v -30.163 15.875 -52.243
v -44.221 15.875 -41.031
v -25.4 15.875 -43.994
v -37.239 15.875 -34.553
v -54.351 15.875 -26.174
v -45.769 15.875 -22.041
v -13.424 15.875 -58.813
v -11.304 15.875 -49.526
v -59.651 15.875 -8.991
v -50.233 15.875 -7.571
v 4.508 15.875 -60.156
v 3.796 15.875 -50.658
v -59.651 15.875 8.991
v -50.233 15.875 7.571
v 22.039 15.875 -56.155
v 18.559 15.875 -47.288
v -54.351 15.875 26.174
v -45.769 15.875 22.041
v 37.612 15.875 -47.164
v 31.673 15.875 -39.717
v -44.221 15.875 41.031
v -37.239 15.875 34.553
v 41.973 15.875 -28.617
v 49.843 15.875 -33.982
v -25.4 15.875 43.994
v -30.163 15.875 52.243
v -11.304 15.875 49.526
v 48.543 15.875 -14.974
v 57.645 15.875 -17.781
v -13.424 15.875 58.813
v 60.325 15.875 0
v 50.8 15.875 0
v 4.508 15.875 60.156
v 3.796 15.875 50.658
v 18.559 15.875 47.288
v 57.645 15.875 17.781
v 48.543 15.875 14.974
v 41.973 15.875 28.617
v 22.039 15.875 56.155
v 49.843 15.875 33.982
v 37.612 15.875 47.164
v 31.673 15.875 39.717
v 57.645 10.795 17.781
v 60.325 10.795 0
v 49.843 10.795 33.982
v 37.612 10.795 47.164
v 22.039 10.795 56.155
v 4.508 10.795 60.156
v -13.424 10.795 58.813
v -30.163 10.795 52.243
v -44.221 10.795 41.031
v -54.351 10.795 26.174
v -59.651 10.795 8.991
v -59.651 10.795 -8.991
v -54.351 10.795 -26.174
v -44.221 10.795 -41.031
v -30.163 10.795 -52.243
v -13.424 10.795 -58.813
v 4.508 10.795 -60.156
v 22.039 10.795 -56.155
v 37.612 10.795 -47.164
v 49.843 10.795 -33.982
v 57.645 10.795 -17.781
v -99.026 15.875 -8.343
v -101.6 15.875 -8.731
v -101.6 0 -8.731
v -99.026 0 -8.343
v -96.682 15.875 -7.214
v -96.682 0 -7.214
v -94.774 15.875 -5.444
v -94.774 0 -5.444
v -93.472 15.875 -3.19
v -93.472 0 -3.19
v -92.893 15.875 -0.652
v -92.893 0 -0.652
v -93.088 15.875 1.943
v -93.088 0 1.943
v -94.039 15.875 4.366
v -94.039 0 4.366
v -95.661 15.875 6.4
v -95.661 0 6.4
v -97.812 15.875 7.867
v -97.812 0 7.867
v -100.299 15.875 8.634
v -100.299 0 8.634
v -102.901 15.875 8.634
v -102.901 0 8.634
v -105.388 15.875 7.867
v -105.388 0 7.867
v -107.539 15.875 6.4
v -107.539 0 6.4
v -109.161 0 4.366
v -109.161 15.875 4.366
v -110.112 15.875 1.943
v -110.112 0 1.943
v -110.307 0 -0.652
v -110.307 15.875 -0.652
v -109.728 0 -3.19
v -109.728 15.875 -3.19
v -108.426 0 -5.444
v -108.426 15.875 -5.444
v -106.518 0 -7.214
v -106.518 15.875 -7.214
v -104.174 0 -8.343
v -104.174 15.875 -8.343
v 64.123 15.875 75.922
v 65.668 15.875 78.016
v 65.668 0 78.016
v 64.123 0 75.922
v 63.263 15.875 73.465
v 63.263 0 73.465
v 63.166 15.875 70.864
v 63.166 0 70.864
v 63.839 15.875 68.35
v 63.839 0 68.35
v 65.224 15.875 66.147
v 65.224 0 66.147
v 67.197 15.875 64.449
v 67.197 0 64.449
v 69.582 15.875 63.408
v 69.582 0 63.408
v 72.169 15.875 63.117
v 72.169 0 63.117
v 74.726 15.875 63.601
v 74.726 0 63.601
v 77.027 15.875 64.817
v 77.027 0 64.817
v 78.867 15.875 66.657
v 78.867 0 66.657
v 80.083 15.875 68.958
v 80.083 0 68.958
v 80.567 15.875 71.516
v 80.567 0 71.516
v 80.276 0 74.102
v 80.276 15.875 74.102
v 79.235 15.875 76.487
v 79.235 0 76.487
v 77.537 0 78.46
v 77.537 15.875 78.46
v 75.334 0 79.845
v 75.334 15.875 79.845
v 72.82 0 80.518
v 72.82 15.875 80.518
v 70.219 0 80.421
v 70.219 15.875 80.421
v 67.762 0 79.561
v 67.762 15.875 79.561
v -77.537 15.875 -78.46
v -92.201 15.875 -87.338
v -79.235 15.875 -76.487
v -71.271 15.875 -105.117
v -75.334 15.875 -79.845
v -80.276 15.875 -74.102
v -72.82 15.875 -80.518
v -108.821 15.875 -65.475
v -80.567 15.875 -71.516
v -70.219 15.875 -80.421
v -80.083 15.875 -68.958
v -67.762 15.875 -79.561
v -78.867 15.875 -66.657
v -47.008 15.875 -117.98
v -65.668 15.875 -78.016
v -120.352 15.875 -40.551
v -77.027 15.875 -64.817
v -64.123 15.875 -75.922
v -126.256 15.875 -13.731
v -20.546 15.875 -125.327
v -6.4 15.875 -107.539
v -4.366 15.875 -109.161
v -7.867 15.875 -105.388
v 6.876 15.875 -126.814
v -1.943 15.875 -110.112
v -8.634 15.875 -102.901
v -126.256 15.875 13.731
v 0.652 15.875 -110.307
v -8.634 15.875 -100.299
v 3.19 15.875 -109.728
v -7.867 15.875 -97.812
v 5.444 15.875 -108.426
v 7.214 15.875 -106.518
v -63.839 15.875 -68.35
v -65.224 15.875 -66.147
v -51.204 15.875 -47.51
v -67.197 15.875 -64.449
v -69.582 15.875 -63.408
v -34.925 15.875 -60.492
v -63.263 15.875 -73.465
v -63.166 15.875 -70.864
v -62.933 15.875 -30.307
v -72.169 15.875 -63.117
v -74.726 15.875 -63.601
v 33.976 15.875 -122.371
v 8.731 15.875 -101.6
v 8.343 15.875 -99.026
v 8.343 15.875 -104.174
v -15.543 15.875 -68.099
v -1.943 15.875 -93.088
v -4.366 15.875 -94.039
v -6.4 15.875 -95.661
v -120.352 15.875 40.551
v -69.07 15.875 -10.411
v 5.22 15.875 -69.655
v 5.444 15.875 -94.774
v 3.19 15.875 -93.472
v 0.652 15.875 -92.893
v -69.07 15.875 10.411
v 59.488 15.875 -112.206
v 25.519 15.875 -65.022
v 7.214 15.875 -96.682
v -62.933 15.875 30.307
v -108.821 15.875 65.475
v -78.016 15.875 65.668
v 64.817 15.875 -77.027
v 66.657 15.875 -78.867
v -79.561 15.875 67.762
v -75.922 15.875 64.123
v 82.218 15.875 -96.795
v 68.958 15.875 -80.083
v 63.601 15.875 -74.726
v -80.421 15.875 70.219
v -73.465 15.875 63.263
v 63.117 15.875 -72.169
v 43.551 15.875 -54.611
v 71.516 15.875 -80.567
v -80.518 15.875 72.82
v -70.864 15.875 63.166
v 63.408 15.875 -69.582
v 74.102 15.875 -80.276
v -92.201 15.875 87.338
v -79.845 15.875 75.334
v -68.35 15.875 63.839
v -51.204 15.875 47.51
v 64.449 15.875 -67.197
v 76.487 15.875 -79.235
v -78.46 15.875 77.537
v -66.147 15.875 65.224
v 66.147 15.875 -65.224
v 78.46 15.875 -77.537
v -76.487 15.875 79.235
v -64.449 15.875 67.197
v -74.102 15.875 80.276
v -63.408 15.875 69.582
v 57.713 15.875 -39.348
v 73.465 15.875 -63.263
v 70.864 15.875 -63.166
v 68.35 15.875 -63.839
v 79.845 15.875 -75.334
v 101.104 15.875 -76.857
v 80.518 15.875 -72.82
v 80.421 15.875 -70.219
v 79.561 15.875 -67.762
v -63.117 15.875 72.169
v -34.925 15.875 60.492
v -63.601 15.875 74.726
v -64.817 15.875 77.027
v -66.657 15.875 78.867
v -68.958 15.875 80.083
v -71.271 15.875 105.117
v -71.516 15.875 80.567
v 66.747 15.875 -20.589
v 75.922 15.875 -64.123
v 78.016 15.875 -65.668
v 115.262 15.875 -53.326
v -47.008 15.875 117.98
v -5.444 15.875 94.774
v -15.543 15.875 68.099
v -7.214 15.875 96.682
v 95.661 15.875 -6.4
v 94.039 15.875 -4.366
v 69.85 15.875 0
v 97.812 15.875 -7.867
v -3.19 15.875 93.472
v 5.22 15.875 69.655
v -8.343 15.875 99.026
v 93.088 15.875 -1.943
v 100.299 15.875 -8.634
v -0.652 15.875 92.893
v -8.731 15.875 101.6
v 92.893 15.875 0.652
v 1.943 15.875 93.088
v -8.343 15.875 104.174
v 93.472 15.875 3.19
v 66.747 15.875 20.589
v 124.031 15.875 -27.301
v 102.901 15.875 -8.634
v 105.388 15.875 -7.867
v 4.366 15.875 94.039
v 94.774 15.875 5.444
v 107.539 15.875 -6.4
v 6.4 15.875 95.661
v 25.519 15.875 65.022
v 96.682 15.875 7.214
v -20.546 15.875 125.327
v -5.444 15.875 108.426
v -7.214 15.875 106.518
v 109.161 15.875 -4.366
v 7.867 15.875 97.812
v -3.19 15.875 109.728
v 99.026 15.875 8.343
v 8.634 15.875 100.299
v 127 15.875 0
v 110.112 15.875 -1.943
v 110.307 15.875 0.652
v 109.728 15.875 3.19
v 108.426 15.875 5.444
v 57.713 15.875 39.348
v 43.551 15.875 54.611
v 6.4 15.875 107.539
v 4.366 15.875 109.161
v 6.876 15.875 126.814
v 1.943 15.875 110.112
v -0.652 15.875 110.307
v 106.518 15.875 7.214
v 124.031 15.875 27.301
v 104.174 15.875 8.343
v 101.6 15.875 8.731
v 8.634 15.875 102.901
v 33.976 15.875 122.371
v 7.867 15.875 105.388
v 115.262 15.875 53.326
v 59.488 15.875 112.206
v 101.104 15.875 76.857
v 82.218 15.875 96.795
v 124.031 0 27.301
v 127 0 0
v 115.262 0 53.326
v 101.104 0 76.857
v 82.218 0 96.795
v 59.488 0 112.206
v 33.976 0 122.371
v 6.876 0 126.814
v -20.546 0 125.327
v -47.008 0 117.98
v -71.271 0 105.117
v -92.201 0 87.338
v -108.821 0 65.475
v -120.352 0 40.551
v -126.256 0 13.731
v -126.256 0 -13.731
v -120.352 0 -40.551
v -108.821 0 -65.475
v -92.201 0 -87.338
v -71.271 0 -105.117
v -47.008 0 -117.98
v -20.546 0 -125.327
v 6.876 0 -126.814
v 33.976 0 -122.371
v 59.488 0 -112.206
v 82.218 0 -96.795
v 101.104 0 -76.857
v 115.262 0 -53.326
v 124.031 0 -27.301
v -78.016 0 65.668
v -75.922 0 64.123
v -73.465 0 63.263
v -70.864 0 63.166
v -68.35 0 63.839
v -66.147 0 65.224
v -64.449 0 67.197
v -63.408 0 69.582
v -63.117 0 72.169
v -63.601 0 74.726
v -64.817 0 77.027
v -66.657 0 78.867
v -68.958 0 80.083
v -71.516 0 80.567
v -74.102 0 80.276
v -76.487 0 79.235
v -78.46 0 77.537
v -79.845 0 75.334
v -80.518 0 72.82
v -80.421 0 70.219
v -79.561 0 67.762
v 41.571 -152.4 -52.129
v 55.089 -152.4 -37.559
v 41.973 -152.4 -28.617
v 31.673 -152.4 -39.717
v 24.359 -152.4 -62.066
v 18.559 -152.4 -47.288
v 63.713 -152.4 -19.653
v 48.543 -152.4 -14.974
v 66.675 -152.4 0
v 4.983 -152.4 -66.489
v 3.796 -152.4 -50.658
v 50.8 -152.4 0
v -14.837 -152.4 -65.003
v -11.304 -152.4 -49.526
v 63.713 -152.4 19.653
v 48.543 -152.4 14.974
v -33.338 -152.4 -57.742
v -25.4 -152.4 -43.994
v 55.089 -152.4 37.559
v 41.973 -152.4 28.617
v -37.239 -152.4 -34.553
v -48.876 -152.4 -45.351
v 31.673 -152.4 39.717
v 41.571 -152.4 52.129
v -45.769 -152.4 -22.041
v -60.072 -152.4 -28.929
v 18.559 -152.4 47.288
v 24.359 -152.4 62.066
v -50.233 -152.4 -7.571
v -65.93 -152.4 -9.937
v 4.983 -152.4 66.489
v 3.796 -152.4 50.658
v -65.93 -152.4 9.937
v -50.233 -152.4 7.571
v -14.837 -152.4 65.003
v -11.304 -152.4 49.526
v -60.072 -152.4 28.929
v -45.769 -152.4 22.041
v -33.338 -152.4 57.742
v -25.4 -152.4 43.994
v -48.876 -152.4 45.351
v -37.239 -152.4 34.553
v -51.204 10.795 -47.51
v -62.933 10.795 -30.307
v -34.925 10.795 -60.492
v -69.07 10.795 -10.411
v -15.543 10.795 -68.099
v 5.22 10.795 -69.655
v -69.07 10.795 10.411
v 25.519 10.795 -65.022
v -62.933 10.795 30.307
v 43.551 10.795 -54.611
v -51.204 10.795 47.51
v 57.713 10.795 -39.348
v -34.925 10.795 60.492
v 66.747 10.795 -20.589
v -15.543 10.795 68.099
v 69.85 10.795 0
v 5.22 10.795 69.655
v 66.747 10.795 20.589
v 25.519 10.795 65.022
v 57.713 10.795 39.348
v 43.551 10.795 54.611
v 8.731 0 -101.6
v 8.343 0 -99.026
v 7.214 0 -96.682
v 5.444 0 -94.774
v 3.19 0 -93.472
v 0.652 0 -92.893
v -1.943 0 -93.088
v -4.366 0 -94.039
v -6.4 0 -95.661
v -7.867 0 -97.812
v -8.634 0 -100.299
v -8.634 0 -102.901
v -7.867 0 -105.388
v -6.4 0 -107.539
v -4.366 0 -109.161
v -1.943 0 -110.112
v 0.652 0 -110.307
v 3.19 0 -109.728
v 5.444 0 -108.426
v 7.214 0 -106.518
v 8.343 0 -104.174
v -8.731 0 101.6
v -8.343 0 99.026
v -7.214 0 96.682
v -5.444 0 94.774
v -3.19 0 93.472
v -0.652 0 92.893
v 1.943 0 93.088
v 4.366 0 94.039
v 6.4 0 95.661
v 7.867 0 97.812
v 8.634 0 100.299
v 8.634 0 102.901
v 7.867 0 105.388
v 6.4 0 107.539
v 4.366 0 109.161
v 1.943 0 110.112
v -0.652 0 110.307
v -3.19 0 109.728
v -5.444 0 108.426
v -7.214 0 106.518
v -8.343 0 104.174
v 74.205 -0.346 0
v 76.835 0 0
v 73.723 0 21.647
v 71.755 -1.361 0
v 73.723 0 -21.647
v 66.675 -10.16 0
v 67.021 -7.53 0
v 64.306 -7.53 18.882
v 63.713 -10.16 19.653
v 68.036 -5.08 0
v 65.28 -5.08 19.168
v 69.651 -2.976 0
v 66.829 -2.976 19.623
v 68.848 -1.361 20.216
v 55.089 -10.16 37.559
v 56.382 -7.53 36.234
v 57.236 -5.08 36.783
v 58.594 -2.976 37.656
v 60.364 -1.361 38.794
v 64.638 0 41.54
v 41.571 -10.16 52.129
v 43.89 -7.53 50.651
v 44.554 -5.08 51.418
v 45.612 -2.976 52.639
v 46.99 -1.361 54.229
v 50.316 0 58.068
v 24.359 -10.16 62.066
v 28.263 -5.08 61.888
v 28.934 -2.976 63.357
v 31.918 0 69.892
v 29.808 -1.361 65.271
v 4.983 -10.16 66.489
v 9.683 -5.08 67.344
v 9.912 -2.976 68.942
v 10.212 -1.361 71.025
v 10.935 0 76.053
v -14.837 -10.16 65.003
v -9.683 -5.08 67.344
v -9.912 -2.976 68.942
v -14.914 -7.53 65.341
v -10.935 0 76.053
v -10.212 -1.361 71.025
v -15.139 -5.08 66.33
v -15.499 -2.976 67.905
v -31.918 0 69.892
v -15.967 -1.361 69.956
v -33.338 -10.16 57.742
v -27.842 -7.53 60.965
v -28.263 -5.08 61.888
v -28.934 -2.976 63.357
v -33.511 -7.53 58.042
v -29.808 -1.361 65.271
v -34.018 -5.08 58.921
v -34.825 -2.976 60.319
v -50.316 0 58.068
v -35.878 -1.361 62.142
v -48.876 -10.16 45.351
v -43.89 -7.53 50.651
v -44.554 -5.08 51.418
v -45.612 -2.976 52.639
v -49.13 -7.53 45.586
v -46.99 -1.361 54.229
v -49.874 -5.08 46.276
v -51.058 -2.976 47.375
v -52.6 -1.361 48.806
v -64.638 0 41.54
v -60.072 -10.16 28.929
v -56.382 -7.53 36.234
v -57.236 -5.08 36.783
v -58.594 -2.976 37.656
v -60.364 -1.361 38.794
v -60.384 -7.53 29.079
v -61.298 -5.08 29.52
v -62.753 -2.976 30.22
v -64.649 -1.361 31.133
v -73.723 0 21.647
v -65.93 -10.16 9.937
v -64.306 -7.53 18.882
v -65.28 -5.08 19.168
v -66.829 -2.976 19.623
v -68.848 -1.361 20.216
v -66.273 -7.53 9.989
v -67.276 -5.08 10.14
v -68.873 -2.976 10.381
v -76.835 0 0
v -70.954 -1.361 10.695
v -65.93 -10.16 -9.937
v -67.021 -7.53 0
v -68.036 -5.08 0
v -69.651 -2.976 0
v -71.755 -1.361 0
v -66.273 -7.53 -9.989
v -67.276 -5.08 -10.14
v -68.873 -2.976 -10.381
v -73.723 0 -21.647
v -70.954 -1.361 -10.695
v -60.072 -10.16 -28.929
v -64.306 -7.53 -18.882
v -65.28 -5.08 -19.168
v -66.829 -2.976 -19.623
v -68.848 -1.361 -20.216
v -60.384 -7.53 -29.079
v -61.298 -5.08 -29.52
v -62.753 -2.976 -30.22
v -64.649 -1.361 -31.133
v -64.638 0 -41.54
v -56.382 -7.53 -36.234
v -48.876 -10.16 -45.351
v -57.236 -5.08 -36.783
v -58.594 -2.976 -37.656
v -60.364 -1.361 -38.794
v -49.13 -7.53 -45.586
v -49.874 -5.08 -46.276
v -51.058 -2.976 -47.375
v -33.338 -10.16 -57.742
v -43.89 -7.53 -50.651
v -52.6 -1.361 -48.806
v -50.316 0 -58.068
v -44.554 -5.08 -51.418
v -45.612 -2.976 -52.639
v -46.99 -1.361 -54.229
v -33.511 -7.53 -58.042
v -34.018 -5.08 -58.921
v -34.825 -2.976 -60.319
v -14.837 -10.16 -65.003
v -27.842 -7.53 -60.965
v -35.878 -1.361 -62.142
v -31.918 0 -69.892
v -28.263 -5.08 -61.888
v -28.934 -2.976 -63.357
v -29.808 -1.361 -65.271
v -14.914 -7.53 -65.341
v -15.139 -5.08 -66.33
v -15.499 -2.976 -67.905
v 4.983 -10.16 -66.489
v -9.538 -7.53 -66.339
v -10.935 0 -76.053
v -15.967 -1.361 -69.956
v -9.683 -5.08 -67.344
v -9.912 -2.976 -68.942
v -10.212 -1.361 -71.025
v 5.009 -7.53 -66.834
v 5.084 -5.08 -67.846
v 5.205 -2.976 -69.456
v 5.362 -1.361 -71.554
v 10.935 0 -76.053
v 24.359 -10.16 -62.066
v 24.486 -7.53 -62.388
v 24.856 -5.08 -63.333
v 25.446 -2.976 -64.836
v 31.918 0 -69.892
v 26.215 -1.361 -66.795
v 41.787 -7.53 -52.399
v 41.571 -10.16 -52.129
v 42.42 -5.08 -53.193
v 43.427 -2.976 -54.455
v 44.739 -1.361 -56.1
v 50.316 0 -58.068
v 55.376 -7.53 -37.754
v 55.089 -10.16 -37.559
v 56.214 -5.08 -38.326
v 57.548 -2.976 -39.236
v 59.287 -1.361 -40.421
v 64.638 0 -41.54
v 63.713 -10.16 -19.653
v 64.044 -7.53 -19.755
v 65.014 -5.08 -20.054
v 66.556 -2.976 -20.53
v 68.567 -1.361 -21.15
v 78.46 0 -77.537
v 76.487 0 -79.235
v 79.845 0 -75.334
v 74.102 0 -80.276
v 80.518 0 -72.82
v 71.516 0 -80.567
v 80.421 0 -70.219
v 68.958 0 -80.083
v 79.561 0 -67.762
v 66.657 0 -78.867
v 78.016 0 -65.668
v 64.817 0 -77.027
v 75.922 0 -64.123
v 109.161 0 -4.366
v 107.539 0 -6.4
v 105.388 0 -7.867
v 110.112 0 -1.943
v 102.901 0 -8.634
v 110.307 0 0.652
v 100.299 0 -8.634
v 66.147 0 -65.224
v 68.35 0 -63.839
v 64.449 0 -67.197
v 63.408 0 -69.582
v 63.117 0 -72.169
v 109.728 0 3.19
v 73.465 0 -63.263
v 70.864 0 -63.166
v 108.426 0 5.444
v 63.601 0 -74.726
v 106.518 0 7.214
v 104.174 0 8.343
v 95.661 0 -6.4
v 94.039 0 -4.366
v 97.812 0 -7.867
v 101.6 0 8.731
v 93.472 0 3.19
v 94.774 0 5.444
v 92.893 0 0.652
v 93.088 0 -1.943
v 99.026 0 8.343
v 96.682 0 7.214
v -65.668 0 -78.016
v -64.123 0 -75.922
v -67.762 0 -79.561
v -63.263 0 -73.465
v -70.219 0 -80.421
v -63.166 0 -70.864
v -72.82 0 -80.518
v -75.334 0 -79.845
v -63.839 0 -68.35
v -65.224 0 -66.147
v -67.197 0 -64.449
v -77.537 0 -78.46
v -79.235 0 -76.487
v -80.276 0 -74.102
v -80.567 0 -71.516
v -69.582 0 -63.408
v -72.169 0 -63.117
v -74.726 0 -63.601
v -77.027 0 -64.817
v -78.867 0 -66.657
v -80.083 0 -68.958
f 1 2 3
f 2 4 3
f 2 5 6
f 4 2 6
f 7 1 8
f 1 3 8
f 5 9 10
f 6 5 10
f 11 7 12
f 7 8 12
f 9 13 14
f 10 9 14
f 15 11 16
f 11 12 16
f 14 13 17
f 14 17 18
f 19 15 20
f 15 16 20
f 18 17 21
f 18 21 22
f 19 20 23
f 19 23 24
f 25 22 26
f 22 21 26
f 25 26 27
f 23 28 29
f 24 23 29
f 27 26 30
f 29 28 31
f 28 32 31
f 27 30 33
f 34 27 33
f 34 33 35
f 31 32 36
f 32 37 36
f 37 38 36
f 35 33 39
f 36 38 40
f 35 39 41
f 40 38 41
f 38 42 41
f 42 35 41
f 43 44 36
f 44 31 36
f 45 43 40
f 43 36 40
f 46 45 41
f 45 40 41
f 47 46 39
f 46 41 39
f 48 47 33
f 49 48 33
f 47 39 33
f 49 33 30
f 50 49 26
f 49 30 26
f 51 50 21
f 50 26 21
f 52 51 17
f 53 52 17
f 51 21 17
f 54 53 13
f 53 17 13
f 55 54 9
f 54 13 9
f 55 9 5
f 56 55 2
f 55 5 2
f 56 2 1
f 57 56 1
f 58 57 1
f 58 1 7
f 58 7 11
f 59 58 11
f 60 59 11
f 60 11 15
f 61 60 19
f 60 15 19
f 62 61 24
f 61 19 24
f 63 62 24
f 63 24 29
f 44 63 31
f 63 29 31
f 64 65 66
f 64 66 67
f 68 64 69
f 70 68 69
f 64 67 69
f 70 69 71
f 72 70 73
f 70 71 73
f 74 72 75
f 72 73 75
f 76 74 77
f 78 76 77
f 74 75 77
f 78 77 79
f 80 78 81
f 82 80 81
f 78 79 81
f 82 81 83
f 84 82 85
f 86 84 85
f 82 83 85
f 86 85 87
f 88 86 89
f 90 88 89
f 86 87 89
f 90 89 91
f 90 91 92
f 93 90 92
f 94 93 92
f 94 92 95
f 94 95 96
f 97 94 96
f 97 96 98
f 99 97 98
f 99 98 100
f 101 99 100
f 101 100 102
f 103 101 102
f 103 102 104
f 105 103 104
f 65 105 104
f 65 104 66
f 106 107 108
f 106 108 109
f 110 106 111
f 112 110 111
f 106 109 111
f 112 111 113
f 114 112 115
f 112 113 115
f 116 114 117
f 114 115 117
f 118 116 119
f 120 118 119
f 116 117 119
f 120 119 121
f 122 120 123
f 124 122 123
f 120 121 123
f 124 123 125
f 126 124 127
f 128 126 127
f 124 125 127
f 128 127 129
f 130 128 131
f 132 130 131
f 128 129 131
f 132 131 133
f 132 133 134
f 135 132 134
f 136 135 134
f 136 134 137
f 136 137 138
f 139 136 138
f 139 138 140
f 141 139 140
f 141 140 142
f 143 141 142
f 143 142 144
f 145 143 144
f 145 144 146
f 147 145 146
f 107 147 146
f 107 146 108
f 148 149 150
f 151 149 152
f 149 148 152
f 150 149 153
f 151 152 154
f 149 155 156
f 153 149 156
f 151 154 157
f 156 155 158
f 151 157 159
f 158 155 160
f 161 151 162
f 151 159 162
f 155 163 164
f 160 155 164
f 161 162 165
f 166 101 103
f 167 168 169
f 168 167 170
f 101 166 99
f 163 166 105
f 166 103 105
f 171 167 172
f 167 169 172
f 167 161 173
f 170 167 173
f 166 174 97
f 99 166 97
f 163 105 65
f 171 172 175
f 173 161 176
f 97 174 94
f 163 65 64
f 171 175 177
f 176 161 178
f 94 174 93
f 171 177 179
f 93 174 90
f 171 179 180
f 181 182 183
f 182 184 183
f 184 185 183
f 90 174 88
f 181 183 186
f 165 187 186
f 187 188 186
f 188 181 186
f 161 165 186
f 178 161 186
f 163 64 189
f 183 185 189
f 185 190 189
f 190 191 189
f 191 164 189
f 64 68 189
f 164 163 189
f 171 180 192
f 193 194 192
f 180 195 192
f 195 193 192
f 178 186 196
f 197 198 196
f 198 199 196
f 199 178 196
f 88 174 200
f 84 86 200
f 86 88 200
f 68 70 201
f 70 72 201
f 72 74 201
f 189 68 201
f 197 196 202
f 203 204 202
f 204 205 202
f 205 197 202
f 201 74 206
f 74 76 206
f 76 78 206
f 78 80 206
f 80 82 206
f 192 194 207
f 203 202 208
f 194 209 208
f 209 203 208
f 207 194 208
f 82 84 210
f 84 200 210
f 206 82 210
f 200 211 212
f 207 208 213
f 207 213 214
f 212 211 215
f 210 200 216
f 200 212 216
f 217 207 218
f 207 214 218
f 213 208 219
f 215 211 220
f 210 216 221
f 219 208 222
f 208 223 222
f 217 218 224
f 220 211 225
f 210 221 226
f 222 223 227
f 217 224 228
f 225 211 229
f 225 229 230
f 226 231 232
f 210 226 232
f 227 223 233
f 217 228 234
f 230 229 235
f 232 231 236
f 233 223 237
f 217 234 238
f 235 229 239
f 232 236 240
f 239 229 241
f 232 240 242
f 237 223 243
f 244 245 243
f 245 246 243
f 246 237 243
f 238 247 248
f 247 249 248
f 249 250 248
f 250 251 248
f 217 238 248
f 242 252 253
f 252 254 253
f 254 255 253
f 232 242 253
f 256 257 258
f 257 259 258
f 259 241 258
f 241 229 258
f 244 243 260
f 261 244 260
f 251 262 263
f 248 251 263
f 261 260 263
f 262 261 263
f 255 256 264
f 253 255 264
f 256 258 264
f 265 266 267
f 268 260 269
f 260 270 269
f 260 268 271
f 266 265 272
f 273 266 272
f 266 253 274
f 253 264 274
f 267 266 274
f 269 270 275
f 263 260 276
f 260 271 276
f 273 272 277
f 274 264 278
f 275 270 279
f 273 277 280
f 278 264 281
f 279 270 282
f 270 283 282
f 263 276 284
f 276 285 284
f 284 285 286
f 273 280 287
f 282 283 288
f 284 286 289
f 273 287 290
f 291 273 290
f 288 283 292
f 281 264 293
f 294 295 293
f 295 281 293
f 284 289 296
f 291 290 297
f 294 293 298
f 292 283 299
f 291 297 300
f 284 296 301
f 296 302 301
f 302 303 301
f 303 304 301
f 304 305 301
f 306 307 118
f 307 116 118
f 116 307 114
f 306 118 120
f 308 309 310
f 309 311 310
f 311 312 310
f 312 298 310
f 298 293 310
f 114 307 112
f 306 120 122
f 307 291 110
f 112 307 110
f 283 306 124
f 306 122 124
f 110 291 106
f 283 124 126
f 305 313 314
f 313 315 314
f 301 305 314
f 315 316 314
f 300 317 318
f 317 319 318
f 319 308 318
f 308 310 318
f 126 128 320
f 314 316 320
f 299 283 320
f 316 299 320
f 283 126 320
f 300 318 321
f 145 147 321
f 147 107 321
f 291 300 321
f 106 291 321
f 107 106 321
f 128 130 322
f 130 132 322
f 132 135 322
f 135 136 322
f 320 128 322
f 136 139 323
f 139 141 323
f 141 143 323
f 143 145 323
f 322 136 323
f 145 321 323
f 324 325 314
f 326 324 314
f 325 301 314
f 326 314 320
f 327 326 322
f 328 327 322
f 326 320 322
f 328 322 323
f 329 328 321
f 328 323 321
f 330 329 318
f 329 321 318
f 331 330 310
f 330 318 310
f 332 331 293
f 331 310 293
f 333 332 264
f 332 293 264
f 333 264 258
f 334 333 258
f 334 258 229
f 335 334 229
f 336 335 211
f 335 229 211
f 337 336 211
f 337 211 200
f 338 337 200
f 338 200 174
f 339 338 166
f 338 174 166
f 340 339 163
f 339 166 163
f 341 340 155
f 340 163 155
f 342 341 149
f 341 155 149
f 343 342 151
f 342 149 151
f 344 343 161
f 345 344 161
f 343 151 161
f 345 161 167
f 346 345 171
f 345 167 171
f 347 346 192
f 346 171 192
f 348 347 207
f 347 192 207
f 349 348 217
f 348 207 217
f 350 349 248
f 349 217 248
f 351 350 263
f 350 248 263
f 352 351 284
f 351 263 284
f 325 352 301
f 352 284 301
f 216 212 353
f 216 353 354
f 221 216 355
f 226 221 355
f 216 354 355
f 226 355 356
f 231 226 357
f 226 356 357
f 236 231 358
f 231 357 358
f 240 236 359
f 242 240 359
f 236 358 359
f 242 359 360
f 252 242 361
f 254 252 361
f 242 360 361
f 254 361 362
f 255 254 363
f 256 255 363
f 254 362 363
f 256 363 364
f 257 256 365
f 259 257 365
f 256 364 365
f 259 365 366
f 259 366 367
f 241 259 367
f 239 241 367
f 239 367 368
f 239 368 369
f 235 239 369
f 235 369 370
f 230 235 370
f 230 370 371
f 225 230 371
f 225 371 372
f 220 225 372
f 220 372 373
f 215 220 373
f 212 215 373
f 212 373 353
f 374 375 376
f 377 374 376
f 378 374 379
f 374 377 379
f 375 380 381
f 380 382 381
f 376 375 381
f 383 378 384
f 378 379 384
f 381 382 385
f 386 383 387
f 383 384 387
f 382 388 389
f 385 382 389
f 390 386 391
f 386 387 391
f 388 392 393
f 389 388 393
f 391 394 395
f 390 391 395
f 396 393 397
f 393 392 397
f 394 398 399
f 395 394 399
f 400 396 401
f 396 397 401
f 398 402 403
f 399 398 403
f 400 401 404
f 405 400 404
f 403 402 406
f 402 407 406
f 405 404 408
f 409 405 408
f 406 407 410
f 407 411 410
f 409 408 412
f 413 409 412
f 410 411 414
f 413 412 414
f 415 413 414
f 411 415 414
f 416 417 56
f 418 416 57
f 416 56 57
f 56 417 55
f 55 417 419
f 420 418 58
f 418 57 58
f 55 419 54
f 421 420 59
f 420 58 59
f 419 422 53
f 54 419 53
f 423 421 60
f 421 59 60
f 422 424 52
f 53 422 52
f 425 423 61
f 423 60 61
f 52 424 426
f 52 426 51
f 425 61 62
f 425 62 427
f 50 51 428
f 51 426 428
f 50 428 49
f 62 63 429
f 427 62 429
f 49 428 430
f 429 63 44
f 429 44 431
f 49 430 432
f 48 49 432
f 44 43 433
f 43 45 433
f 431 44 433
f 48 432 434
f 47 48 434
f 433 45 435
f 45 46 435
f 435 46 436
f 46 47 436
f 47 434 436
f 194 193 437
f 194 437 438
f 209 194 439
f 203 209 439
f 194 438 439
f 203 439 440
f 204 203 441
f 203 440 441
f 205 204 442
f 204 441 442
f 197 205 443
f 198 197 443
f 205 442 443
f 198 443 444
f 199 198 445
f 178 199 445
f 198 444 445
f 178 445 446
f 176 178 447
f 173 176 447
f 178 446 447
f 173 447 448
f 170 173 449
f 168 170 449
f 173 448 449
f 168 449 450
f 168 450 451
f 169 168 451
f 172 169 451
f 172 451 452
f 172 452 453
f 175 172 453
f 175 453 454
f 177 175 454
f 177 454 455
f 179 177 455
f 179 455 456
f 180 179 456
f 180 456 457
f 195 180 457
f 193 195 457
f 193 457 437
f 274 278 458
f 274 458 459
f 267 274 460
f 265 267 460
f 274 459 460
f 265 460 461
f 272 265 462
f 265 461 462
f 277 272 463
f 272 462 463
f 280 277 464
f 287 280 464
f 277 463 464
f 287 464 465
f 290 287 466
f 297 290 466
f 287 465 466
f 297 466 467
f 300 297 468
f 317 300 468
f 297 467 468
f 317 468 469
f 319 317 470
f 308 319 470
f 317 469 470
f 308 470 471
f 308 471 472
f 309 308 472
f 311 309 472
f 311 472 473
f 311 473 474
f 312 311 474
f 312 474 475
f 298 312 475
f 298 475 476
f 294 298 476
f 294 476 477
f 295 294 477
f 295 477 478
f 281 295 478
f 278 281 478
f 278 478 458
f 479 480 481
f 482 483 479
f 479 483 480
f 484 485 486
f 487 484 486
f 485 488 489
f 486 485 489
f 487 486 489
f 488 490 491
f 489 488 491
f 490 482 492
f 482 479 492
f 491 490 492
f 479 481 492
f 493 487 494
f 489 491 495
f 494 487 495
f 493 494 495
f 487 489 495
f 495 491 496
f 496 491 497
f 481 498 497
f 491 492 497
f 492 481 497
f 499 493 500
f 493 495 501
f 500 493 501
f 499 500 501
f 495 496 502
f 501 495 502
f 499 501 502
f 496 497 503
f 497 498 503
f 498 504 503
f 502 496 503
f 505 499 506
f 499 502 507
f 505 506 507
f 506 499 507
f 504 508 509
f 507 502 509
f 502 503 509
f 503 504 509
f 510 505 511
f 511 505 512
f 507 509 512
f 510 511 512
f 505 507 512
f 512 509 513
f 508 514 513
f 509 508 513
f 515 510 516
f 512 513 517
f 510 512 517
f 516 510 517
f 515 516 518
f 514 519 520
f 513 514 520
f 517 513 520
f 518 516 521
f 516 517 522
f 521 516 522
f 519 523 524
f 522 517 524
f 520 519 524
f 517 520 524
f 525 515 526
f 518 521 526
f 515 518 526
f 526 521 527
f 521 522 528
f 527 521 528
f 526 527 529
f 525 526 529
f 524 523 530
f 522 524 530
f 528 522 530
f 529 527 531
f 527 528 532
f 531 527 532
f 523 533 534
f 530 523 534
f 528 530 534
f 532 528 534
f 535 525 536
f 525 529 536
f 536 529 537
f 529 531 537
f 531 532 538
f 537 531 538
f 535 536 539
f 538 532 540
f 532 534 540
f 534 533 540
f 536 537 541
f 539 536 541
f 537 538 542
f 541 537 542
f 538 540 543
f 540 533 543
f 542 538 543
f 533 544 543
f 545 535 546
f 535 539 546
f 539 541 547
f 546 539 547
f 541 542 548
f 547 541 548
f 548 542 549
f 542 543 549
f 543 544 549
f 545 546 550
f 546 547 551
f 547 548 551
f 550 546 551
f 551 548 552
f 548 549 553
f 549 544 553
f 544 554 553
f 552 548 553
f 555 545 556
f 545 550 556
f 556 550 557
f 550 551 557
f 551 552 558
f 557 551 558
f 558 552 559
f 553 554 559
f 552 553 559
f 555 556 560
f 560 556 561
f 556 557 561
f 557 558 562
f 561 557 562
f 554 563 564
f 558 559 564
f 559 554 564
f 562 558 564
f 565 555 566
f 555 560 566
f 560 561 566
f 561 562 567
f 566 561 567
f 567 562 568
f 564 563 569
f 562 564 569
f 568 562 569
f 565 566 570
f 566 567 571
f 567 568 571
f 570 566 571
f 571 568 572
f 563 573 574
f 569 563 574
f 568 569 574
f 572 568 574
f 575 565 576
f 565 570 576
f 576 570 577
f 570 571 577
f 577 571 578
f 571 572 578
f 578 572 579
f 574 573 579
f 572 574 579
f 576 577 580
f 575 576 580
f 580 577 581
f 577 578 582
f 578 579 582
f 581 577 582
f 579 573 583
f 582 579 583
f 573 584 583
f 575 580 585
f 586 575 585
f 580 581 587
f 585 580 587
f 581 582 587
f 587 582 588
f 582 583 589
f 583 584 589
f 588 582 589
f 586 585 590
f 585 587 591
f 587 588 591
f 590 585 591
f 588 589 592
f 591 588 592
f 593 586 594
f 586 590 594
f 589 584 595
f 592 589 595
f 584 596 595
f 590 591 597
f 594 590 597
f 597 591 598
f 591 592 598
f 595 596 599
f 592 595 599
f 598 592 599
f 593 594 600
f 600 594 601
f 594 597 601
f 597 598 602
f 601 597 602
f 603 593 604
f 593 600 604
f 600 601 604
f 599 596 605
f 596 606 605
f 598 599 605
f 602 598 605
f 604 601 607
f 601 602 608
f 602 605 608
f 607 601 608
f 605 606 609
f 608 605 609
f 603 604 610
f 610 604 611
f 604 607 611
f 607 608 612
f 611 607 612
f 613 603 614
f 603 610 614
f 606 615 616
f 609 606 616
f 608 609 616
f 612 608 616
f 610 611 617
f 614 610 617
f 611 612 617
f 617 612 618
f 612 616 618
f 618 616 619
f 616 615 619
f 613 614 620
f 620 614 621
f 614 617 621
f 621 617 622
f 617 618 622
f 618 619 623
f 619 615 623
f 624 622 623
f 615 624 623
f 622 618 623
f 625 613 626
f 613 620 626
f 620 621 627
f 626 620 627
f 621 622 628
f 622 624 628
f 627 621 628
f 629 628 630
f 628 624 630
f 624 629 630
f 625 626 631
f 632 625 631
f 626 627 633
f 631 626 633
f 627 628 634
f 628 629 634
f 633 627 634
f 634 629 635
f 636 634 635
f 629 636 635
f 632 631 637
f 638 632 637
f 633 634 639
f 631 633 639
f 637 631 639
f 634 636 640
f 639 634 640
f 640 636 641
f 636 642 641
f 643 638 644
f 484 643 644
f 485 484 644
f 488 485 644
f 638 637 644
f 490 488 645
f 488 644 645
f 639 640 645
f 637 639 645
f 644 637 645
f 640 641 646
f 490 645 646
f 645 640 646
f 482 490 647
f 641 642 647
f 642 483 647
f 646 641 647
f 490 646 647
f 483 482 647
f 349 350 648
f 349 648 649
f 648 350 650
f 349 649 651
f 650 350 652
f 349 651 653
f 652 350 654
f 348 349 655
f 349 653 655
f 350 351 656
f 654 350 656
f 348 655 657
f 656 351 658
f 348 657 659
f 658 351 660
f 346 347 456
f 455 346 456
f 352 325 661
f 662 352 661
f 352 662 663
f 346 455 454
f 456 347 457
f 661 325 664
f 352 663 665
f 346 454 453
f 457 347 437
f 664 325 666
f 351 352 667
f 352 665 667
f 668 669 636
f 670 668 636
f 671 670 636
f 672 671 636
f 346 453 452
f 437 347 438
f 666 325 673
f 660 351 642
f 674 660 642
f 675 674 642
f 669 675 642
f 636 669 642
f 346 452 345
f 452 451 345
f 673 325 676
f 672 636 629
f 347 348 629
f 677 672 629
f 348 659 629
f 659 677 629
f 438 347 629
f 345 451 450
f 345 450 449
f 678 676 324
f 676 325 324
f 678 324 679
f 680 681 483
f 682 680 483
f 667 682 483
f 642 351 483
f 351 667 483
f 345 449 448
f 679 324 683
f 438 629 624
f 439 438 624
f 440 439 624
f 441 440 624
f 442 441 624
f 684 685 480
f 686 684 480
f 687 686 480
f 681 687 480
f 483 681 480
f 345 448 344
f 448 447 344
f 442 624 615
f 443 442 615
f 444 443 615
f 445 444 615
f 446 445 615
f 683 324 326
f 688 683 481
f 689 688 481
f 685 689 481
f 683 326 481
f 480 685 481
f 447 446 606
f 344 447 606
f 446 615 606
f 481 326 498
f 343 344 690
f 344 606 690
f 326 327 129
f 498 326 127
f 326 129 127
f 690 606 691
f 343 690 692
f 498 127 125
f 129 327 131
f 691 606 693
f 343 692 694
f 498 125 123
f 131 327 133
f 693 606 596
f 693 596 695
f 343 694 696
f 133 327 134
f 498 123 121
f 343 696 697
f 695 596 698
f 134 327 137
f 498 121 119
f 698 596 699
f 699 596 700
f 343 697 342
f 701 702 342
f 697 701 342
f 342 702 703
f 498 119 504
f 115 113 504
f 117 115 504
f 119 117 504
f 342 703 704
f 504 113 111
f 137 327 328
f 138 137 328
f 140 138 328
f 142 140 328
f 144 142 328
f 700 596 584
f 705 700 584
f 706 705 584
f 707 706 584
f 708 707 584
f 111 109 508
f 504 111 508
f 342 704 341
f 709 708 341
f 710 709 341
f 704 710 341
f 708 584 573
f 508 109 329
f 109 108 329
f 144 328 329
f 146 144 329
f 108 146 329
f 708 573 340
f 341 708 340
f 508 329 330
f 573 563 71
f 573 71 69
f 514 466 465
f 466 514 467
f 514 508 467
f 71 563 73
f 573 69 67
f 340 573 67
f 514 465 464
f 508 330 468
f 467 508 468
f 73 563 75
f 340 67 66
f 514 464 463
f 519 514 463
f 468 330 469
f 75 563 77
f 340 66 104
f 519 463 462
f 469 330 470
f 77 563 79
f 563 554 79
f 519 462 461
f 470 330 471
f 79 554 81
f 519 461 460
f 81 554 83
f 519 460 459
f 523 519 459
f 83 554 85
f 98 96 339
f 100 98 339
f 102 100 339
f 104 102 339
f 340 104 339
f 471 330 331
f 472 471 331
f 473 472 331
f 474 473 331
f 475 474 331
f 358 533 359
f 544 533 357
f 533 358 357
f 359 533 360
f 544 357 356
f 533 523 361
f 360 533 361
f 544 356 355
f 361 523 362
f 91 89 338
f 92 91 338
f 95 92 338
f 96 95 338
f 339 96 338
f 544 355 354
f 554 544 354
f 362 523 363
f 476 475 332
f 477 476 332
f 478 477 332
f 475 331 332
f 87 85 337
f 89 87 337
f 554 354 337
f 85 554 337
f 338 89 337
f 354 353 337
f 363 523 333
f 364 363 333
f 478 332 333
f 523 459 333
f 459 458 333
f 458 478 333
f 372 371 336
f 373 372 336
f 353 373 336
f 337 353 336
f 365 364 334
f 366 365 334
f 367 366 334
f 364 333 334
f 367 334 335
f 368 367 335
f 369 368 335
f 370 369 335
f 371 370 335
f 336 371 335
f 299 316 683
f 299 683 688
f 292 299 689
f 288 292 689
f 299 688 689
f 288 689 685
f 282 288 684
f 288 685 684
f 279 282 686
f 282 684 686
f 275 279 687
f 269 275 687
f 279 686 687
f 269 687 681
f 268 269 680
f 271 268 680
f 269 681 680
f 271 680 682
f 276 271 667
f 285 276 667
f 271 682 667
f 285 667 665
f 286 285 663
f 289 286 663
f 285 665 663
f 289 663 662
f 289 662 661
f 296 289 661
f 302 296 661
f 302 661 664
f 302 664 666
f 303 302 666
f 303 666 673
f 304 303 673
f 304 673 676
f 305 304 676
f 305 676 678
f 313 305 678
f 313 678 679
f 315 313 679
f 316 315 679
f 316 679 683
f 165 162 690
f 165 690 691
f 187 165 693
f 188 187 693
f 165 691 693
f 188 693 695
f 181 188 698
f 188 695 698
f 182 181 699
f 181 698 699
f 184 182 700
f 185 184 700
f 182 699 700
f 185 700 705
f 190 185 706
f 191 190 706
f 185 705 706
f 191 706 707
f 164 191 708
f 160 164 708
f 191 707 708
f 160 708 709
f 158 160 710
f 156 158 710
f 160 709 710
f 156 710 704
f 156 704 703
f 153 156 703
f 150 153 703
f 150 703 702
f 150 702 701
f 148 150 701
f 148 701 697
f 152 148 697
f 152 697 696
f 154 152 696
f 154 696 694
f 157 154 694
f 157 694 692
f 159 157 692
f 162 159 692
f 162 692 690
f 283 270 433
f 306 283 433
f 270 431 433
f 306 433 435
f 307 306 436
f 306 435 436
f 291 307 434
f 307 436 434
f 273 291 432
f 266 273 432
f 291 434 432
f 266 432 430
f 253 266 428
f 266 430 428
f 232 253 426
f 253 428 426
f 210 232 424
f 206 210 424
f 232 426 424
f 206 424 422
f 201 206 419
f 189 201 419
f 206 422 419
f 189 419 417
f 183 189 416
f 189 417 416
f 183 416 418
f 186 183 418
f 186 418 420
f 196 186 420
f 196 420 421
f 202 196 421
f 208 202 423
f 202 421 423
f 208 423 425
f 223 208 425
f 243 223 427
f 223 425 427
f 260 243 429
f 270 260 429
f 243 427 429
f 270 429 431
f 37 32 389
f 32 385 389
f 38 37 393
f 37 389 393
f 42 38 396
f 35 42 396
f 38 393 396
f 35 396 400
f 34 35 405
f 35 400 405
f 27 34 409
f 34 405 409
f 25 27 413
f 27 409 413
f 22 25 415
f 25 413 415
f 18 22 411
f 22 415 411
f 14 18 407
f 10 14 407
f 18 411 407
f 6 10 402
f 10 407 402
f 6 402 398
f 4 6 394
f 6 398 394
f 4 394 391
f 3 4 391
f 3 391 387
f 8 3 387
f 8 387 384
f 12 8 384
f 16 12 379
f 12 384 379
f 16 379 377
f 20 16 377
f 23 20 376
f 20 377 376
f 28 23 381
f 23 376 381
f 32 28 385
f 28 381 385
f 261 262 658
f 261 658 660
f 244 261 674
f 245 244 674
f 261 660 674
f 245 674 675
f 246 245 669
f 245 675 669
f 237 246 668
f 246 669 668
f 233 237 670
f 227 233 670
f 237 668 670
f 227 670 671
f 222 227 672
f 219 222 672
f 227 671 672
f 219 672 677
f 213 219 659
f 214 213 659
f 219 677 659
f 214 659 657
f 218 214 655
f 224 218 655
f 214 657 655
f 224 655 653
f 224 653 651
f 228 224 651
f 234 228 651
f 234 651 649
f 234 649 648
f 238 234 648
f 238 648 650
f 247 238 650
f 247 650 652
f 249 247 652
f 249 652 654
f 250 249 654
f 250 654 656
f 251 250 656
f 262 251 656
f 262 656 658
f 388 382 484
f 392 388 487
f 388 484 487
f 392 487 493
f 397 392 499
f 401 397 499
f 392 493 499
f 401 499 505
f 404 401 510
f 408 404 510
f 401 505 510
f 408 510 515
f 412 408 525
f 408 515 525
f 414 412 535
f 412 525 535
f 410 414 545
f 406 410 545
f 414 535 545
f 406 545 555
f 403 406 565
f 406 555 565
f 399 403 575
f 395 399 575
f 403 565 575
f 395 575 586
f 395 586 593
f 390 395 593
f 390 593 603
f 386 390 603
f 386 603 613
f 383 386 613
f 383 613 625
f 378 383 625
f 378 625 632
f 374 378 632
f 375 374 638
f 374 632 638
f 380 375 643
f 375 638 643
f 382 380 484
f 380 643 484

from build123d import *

# Parameters (mm, degrees)
FILLET1_R                       = 10.16
F_11_16_0_6875_DIAMETER_HOLE1_D = 17.4625
CIRPATTERN1_COUNT               = 8


with BuildPart() as part:
    # Sketch1 → Revolve1 (revolve)
    with BuildSketch(Plane.XY):
        Polygon((50.8, -152.4), (66.675, -152.4), (66.675, 0), (127, 0), (127, 15.875), (69.85, 15.875), (69.85, 10.795), (60.325, 10.795), (60.325, 15.875), (50.8, 15.875), align=None)
    revolve(axis=Axis((0, 66.332099957, 0), (0, -1, 0)))

    # Fillet1
    fillet1_edges = [part.edges().sort_by_distance(p)[0] for p in [
        (-66.675, 0, 0),
    ]]
    fillet(fillet1_edges, radius=FILLET1_R)

    # 11/16 (0.6875) Diameter Hole1 (through all)
    with Locations(Plane(origin=(0, 15.875, 0), x_dir=(-1, 0, 0), z_dir=(0, 1, 0))):
        with Locations((0, -101.6)):
            f_11_16_0_6875_diameter_hole1 = Hole(F_11_16_0_6875_DIAMETER_HOLE1_D / 2)

    # CirPattern1: 11/16 (0.6875) Diameter Hole1 ×8 about axis
    cirpattern1_axis = Axis((0, -152.4, 0), (0, 1, 0))
    for i in range(1, CIRPATTERN1_COUNT):
        add(f_11_16_0_6875_diameter_hole1.rotate(cirpattern1_axis, i * 360 / CIRPATTERN1_COUNT), mode=Mode.SUBTRACT)


solid = part.part
